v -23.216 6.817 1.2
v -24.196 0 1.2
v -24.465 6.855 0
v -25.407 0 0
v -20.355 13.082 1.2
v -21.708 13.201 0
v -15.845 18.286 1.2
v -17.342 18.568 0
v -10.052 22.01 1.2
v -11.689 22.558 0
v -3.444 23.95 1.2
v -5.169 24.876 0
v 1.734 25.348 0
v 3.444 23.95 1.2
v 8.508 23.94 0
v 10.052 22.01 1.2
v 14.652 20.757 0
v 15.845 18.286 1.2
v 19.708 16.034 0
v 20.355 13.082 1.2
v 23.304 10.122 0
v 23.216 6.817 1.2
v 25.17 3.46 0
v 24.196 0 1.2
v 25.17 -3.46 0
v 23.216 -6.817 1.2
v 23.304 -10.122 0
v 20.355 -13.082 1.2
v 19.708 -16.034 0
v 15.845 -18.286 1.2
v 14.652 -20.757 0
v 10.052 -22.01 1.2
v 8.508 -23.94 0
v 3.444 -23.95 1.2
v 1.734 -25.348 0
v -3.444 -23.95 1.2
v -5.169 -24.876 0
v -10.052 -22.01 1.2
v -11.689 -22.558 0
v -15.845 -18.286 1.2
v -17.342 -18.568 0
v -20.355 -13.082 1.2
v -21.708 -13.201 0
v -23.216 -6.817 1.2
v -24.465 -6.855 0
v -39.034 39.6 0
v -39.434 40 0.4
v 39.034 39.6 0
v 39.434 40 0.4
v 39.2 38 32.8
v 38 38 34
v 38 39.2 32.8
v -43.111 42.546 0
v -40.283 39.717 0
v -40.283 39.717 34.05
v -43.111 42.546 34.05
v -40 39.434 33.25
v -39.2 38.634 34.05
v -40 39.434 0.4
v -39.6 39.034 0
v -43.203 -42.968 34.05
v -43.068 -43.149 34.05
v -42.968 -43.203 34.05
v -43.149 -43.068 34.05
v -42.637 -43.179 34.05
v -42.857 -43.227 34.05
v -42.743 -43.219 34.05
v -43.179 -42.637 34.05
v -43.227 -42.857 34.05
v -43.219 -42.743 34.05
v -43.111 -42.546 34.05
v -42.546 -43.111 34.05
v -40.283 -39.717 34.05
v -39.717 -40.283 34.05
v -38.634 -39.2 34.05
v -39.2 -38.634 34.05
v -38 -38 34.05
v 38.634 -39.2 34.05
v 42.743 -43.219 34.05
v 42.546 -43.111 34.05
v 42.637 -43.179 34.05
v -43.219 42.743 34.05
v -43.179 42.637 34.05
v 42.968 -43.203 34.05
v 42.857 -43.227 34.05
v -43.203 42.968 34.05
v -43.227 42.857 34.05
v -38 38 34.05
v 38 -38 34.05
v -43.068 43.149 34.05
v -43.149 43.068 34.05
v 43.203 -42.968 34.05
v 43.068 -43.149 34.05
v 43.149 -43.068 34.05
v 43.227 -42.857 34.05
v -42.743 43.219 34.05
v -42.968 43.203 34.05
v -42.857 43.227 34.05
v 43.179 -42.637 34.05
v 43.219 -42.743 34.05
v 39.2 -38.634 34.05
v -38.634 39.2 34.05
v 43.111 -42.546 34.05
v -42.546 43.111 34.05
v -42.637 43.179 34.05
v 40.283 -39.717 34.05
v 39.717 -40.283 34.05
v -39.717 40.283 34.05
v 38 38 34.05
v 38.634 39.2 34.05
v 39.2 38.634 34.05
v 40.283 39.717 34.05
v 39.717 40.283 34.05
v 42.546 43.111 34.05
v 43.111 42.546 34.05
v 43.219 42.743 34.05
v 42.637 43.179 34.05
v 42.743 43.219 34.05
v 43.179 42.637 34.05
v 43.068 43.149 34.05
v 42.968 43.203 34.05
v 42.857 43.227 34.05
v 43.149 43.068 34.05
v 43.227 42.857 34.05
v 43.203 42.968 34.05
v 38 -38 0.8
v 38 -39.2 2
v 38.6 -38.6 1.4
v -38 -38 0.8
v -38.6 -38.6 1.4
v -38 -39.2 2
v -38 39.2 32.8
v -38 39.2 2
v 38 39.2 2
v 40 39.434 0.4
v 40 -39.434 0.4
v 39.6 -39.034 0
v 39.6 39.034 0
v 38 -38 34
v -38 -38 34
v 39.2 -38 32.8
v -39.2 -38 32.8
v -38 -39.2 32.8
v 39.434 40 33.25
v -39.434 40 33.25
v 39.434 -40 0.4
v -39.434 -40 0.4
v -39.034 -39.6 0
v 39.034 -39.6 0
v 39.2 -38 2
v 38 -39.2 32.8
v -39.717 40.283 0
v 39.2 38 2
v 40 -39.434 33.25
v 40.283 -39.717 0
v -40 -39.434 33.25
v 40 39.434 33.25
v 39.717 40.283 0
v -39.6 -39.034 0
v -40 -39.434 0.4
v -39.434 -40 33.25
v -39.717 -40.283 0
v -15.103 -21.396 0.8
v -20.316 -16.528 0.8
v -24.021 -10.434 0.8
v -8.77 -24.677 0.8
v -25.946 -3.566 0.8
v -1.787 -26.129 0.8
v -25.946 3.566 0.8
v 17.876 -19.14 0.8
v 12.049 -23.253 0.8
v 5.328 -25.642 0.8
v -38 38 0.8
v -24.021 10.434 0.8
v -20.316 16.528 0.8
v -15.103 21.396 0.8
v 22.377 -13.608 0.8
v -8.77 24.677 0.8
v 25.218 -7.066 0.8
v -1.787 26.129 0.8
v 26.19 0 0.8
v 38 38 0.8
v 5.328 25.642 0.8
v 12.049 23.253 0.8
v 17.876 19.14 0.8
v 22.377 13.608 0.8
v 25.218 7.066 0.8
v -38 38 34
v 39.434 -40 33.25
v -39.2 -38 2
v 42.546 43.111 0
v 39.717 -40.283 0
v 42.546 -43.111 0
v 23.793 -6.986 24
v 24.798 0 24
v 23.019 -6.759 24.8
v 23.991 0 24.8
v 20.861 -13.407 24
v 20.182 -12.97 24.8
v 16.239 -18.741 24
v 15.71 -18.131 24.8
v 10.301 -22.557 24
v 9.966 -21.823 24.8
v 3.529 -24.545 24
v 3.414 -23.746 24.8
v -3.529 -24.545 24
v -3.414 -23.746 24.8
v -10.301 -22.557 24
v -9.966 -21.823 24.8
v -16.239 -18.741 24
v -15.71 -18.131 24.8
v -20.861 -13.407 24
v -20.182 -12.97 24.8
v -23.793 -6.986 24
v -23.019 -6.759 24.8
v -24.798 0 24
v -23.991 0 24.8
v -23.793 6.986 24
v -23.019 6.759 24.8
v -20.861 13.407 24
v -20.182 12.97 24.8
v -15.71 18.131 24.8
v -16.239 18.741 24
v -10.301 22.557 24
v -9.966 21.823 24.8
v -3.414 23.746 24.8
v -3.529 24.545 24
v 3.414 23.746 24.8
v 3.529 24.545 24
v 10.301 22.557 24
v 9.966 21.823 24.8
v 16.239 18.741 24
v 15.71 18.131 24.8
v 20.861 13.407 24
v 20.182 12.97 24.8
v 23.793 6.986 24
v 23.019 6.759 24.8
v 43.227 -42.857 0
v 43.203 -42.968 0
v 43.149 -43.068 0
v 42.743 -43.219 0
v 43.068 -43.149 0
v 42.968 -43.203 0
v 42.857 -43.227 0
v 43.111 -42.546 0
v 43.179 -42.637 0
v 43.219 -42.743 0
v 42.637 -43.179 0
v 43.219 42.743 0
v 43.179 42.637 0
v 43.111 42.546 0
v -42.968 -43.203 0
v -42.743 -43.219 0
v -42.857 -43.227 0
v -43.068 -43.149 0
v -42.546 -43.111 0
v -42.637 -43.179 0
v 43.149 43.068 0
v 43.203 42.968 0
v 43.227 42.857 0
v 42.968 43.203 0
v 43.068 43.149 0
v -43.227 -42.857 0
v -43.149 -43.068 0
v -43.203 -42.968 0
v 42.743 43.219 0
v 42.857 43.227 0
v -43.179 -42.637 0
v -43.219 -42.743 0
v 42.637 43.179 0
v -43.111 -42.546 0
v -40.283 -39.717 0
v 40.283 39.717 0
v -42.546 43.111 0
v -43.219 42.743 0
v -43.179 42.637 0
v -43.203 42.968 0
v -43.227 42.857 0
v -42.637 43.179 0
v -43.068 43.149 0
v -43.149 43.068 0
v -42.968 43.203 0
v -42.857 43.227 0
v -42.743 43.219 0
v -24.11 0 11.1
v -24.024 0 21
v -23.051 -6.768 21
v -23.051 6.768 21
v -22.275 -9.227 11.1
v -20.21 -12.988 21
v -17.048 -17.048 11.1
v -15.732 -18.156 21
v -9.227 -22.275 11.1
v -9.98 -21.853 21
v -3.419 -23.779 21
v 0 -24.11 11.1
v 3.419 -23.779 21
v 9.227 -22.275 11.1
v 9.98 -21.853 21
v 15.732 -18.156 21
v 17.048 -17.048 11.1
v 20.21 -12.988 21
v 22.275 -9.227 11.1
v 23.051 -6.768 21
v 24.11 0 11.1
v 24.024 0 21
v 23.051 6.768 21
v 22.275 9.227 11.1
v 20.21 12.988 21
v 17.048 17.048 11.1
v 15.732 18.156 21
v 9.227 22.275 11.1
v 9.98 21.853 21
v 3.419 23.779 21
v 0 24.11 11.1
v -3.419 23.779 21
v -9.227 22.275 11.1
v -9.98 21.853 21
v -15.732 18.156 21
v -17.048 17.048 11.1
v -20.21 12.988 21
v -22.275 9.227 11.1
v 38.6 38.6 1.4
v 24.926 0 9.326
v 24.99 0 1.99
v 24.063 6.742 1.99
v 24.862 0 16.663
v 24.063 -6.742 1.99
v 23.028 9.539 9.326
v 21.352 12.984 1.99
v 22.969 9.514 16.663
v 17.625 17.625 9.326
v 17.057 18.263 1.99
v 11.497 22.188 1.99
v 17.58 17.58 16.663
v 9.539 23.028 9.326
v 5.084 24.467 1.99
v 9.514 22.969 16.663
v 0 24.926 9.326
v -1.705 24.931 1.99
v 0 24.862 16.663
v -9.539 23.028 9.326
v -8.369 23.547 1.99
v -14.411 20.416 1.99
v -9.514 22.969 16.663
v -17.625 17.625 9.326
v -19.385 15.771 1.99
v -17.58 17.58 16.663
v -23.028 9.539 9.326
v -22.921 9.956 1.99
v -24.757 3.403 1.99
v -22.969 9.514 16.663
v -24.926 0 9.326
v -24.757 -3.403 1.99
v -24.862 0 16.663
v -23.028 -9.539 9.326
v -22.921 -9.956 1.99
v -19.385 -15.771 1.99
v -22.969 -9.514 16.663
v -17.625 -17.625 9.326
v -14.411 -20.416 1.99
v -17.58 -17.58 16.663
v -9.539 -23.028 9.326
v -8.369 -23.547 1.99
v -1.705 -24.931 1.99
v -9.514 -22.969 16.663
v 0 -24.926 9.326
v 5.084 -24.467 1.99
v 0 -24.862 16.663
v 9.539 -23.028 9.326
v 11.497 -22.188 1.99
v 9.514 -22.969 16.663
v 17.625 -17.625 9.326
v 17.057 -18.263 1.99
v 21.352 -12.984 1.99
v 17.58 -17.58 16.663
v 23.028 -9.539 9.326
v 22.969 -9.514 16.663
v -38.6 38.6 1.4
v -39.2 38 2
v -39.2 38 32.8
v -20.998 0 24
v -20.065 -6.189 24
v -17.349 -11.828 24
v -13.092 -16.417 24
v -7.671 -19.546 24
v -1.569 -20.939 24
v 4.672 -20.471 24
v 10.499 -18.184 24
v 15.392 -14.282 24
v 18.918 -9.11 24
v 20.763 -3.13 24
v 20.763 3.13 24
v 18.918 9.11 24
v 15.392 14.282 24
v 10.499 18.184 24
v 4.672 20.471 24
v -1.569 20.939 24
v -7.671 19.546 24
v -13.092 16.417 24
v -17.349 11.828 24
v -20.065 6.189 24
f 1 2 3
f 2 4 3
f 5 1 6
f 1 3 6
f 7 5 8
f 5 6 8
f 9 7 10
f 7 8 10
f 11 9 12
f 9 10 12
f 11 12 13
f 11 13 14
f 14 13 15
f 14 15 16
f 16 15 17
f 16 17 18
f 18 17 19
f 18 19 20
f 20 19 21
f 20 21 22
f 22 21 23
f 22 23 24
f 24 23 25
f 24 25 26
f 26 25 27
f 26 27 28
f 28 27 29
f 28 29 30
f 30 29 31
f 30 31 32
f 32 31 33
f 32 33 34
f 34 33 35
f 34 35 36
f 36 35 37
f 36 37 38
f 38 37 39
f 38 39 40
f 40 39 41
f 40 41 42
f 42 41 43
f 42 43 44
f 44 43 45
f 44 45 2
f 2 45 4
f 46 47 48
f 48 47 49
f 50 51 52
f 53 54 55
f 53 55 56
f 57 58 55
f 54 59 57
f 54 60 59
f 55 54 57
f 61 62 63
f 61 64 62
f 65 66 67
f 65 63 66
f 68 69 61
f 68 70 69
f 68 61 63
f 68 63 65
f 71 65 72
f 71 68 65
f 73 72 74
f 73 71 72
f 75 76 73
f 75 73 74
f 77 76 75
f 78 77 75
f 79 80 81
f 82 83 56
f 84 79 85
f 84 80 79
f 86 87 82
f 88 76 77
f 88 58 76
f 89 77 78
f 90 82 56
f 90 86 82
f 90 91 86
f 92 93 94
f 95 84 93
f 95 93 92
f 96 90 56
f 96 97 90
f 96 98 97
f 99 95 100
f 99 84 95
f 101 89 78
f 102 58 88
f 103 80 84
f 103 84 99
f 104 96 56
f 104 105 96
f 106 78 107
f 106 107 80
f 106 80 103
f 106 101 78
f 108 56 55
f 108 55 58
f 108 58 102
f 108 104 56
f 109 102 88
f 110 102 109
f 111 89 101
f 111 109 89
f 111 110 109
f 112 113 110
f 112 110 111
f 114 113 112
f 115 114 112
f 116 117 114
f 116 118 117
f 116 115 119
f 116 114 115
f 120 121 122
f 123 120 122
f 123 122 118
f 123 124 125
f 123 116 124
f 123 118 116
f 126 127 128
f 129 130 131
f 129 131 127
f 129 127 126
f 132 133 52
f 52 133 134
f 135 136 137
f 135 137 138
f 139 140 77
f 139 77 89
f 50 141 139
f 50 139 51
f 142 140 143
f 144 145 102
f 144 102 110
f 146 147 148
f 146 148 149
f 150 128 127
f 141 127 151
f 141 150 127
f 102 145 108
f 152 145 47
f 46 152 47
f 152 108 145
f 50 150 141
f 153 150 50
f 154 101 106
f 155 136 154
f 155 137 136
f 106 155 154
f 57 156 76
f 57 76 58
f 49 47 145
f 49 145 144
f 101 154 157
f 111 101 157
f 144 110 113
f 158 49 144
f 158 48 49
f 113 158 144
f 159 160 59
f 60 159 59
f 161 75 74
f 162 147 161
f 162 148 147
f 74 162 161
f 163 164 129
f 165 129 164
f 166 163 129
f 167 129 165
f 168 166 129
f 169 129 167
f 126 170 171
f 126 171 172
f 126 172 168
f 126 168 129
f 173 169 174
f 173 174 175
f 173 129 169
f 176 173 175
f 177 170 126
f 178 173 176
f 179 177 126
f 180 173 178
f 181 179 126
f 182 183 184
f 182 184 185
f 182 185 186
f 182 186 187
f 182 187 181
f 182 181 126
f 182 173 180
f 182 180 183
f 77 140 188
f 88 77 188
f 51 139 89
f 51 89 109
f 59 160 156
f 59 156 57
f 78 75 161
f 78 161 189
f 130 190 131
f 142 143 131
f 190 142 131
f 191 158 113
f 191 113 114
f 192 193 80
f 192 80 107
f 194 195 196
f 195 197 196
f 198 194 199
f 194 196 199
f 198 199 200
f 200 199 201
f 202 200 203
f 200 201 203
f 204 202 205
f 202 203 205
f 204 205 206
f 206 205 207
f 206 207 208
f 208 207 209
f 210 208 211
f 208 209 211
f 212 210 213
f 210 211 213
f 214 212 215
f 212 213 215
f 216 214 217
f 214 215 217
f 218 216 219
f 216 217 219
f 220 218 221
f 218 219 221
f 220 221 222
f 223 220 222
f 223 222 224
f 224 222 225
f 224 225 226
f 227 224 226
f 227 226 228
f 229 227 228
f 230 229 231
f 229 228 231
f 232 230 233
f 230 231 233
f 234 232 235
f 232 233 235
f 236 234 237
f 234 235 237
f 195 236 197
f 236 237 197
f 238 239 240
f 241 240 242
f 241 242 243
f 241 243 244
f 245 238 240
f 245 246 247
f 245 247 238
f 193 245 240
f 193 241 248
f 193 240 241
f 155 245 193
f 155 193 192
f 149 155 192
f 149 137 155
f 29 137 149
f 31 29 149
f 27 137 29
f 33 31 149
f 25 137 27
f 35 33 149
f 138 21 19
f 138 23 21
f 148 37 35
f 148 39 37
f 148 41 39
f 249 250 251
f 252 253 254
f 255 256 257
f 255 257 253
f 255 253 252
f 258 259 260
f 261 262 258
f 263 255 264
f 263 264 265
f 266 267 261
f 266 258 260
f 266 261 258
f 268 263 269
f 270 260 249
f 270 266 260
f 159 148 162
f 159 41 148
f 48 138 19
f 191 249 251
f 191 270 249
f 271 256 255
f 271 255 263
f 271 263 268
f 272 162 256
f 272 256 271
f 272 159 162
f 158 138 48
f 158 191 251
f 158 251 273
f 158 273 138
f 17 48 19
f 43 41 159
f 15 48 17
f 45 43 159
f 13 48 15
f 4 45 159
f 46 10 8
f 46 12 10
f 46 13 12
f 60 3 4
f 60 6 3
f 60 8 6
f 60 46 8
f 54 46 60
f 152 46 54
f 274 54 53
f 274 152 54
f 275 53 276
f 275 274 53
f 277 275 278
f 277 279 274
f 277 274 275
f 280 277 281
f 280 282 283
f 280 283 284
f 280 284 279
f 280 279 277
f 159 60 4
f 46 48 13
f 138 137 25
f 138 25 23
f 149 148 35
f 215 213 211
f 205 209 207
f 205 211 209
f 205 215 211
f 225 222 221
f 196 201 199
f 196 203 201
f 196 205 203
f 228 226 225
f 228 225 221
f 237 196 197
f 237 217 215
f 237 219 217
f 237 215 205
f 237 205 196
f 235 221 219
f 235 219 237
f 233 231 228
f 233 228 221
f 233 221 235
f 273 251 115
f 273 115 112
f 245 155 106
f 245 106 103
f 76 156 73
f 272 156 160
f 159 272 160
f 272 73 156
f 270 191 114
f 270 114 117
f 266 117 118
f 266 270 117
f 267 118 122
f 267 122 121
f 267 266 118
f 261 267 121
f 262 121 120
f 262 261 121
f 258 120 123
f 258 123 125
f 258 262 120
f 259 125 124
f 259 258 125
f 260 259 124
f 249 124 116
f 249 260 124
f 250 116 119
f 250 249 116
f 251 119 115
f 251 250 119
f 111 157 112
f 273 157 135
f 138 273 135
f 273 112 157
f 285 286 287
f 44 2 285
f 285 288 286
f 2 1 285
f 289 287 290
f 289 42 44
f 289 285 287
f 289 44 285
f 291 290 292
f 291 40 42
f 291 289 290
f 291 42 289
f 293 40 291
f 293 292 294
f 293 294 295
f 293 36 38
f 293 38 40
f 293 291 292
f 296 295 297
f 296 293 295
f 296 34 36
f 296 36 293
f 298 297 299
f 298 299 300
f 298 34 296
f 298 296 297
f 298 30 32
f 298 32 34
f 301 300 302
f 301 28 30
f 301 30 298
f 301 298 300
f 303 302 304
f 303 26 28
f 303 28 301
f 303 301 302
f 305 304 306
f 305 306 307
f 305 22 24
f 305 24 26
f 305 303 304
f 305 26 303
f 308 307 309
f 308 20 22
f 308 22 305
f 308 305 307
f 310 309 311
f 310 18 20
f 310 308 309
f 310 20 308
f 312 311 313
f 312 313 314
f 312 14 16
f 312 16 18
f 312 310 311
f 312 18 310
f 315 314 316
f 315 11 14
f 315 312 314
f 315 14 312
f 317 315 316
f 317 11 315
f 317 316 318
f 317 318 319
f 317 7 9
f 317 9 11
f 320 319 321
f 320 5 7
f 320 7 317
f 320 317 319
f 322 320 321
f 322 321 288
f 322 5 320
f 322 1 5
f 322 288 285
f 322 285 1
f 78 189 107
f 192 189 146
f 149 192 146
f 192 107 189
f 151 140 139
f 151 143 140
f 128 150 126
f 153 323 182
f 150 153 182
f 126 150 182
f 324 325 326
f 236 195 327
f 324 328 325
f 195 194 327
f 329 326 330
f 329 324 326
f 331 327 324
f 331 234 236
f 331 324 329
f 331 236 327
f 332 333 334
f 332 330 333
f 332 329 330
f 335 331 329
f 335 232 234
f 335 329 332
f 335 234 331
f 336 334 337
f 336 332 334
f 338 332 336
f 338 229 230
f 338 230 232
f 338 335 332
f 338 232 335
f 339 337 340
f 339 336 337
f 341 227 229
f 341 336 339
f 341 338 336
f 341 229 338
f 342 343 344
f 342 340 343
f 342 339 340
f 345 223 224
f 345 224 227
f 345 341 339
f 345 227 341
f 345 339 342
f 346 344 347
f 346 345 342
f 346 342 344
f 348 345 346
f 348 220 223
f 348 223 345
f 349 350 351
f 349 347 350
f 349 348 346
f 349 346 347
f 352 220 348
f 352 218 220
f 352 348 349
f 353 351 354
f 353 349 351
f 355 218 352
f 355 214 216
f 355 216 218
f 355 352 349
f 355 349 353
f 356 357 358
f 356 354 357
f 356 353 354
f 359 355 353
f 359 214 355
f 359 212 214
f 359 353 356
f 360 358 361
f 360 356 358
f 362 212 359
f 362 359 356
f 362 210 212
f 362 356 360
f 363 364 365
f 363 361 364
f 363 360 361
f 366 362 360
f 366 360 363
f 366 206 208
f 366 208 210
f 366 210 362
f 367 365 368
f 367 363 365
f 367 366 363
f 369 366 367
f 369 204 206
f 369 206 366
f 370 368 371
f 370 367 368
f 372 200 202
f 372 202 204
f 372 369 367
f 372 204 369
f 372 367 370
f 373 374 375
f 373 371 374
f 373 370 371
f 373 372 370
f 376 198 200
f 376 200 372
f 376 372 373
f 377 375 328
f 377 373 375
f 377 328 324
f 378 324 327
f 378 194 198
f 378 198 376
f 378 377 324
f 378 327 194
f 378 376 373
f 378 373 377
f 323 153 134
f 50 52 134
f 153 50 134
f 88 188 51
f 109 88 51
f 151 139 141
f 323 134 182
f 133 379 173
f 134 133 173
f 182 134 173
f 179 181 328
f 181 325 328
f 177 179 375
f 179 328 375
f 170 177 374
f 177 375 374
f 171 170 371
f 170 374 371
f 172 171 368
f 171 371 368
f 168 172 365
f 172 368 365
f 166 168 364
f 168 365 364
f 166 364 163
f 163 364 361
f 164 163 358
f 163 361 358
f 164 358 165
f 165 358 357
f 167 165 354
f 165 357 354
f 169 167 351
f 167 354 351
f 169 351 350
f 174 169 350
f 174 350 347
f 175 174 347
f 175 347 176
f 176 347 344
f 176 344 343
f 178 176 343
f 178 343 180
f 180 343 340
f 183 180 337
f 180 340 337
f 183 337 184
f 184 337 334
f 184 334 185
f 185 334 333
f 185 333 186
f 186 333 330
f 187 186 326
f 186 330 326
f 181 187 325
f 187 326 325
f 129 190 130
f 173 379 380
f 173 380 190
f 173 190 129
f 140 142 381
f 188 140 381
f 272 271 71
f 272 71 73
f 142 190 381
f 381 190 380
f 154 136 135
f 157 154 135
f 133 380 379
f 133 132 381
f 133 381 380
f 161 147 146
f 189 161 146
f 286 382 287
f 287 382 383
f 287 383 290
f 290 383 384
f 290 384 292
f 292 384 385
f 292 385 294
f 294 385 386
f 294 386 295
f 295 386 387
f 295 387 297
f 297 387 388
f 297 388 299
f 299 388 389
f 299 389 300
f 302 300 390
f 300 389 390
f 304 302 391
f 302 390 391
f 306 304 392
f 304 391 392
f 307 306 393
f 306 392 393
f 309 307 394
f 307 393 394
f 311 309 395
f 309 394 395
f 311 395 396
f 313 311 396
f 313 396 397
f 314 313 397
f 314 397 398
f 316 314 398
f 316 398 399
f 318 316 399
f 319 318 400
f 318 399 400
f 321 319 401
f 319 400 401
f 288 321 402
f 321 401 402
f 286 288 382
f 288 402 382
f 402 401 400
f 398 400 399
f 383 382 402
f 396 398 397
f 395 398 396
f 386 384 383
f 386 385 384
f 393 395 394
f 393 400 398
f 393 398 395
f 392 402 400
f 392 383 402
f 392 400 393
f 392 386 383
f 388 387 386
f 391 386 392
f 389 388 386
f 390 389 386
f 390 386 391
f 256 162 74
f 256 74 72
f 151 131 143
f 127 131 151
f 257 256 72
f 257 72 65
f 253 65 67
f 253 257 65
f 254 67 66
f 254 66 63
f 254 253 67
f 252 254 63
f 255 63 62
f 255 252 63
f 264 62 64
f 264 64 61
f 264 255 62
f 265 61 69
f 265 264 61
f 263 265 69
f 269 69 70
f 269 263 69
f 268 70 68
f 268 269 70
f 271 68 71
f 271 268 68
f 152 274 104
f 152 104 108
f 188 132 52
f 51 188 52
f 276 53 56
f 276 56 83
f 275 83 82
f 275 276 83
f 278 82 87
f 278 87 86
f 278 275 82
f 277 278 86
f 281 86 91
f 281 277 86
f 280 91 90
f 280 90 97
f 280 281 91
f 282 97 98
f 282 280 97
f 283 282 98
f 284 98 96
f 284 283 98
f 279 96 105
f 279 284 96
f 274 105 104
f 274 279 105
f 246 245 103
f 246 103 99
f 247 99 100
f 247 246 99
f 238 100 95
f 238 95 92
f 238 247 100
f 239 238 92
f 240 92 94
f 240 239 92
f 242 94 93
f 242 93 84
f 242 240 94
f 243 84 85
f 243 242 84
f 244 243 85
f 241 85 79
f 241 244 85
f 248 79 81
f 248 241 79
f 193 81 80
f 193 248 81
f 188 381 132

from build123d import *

# Parameters (mm, degrees)
F0_W             = 80
F0_H             = 80
F1_DEPTH         = 34
F2_T             = -0.8
F3_R             = 25
F4_DEPTH         = 24
F4_TAPER         = 0.5
F5_T1_DEPTH      = 78.4
F5_T3_DEPTH      = 78.4
F6_W             = 80
F6_H             = 80
F6_W_2           = 76
F6_H_2           = 76
F7_DEPTH         = 0.05
F8_SIZE          = 1.19999
F11_DEPTH        = 34.05
F11_COPIES_COUNT = 4
F14_SIZE         = 3
F16_SIZE         = 0.4
F17_SIZE         = 0.8


# Not quite as in the source:
# - a fillet or chamfer that OpenCascade refuses, or shapes differently, is made with other operations: its cross-section is extruded or revolved along the edge and cut away or added
# - a fillet or chamfer is up to 0.001 mm smaller than in the source, because OpenCascade refuses the exact size
# - a pattern or mirror of a feature is missing from the dataset's text; its kind, count and spacing are read off the source's solid


with BuildPart() as f1:
    # F0 (on Top) → F1 (new body)
    with BuildSketch(Plane.XY):
        Rectangle(F0_W, F0_H)
    extrude(amount=F1_DEPTH)

    # F2
    f2_openings = [f1.faces().sort_by_distance(p)[0] for p in [
        (0, 0, 34),
    ]]
    offset(amount=F2_T, openings=f2_openings)

    # F3 (on face) → F4 (join)
    with BuildSketch(Plane.XY.offset(0.8)):
        Circle(F3_R)
    extrude(amount=F4_DEPTH, taper=F4_TAPER)

    # F5: chamfer of 1.2 on 5 edges, made by hand

    # F5_s2 → F5_t1 (join)
    with BuildSketch(Plane.XZ.offset(-39.2)):
        Polygon((-39.2, 2), (-38, 0.8), (-39.2, 0.8), align=None)
        Polygon((39.2, 2), (38, 0.8), (39.2, 0.8), align=None)
    extrude(amount=F5_T1_DEPTH)

    # F5_s4 → F5_t3 (join)
    with BuildSketch(Plane.YZ.offset(-39.2)):
        Polygon((-39.2, 2), (-38, 0.8), (-39.2, 0.8), align=None)
        Polygon((39.2, 2), (38, 0.8), (39.2, 0.8), align=None)
    extrude(amount=F5_T3_DEPTH)

    # F5_s5 → F5_t6 (revolve)
    with BuildSketch(Plane.XZ):
        Polygon((26.1895734527, 0.8), (24.989619145, 1.9895281574), (25, 0.8), align=None)
    revolve(axis=Axis((0, 0, 0.8), (0, 0, -1)))

    # F6 (on face) → F7 (join)
    with BuildSketch(Plane.XY.offset(34)):
        Rectangle(F6_W, F6_H)
        Rectangle(F6_W_2, F6_H_2, mode=Mode.SUBTRACT)
    extrude(amount=F7_DEPTH)

    # F8 (size 1.2 in the source; OpenCascade refuses exactly that, so slightly less here)
    f8_edges = [f1.edges().sort_by_distance(p)[0] for p in [
        (0, -39.2, 34),
        (-39.2, 0, 34),
        (-39.2, -39.2, 18),
        (-39.2, 39.2, 18),
        (0, 39.2, 34),
        (39.2, 0, 34),
        (39.2, 39.2, 18),
        (39.2, -39.2, 18),
    ]]
    chamfer(f8_edges, length=F8_SIZE)

    # F9: chamfer of 0.8 on 1 edges, made by hand

    # F9_s1 → F9_t2 (revolve, cut)
    with BuildSketch(Plane.XZ):
        Polygon((24.7975364014, 24.0000304615), (23.990555173, 24.8), (24.790555173, 24.8), align=None)
    revolve(axis=Axis((0, 0, 24.8), (0, 0, -1)), mode=Mode.SUBTRACT)

    # F10 (on face) → F11 (join, through all)
    with BuildSketch(Plane(origin=(0, 0, 0), x_dir=(1, 0, 0), z_dir=(0, 0, -1))):
        with BuildLine():
            Line((-39.1612012219, 39.7268866468), (-39.7171572875, 40.2828427125))
            ThreePointArc((-39.7171572875, 40.2828427125), (-39.7171572875, 39.7171572875), (-40.2828427125, 39.7171572875))
            Line((-40.2828427125, 39.7171572875), (-39.7268866468, 39.1612012219))
            Line((-39.7268866468, 39.1612012219), (-39.1612012219, 39.7268866468))
        make_face()
        with BuildLine():
            ThreePointArc((-40.2828427125, 39.7171572875), (-39.7171572875, 39.7171572875), (-39.7171572875, 40.2828427125))
            Line((-39.7171572875, 40.2828427125), (-42.5455844123, 43.1112698372))
            ThreePointArc((-42.5455844123, 43.1112698372), (-43.1112698372, 43.1112698372), (-43.1112698372, 42.5455844123))
            Line((-43.1112698372, 42.5455844123), (-40.2828427125, 39.7171572875))
        make_face()
    f11 = extrude(amount=-F11_DEPTH)

    # F11_copies: F11 ×4 about axis
    f11_copies_axis = Axis((0, 0, 0), (0, 0, 1))
    for i in range(1, F11_COPIES_COUNT):
        add(f11.rotate(f11_copies_axis, i * 360 / F11_COPIES_COUNT))

    # F12 (on Front) → F13 (revolve, cut)
    with BuildSketch(Plane.XZ):
        Polygon((-23.9975059387, 24.0000304615), (-24.2264749318, -2.2372173829), (0, -2.2372173829), (0, 24.0000304615), align=None)
    revolve(axis=Axis((0, 0, 10.8814065393), (0, 0, 1)), mode=Mode.SUBTRACT)

    # F14
    f14_edges = [f1.edges().sort_by_distance(p)[0] for p in [
        (23.997506, 0, 24.00003),
    ]]
    chamfer(f14_edges, length=F14_SIZE)

    # F15: chamfer of 1.2 on 1 edges, made by hand

    # F15_s1 → F15_t2 (revolve, cut)
    with BuildSketch(Plane.XZ):
        Polygon((-24.1964791889, 1.1999543077), (-25.4069510315, 0), (-24.2069510315, 0), align=None)
    revolve(axis=Axis((0, 0, 0), (0, 0, -1)), mode=Mode.SUBTRACT)

    # F16
    f16_edges = [f1.edges().sort_by_distance(p)[0] for p in [
        (0, -40, 0),
        (-40, 0, 0),
        (40, 0, 0),
        (0, 40, 0),
    ]]
    chamfer(f16_edges, length=F16_SIZE)

    # F17
    f17_edges = [f1.edges().sort_by_distance(p)[0] for p in [
        (0, -40, 34.05),
        (40, 0, 34.05),
        (0, 40, 34.05),
        (-40, 0, 34.05),
    ]]
    chamfer(f17_edges, length=F17_SIZE)


solid = f1.part
